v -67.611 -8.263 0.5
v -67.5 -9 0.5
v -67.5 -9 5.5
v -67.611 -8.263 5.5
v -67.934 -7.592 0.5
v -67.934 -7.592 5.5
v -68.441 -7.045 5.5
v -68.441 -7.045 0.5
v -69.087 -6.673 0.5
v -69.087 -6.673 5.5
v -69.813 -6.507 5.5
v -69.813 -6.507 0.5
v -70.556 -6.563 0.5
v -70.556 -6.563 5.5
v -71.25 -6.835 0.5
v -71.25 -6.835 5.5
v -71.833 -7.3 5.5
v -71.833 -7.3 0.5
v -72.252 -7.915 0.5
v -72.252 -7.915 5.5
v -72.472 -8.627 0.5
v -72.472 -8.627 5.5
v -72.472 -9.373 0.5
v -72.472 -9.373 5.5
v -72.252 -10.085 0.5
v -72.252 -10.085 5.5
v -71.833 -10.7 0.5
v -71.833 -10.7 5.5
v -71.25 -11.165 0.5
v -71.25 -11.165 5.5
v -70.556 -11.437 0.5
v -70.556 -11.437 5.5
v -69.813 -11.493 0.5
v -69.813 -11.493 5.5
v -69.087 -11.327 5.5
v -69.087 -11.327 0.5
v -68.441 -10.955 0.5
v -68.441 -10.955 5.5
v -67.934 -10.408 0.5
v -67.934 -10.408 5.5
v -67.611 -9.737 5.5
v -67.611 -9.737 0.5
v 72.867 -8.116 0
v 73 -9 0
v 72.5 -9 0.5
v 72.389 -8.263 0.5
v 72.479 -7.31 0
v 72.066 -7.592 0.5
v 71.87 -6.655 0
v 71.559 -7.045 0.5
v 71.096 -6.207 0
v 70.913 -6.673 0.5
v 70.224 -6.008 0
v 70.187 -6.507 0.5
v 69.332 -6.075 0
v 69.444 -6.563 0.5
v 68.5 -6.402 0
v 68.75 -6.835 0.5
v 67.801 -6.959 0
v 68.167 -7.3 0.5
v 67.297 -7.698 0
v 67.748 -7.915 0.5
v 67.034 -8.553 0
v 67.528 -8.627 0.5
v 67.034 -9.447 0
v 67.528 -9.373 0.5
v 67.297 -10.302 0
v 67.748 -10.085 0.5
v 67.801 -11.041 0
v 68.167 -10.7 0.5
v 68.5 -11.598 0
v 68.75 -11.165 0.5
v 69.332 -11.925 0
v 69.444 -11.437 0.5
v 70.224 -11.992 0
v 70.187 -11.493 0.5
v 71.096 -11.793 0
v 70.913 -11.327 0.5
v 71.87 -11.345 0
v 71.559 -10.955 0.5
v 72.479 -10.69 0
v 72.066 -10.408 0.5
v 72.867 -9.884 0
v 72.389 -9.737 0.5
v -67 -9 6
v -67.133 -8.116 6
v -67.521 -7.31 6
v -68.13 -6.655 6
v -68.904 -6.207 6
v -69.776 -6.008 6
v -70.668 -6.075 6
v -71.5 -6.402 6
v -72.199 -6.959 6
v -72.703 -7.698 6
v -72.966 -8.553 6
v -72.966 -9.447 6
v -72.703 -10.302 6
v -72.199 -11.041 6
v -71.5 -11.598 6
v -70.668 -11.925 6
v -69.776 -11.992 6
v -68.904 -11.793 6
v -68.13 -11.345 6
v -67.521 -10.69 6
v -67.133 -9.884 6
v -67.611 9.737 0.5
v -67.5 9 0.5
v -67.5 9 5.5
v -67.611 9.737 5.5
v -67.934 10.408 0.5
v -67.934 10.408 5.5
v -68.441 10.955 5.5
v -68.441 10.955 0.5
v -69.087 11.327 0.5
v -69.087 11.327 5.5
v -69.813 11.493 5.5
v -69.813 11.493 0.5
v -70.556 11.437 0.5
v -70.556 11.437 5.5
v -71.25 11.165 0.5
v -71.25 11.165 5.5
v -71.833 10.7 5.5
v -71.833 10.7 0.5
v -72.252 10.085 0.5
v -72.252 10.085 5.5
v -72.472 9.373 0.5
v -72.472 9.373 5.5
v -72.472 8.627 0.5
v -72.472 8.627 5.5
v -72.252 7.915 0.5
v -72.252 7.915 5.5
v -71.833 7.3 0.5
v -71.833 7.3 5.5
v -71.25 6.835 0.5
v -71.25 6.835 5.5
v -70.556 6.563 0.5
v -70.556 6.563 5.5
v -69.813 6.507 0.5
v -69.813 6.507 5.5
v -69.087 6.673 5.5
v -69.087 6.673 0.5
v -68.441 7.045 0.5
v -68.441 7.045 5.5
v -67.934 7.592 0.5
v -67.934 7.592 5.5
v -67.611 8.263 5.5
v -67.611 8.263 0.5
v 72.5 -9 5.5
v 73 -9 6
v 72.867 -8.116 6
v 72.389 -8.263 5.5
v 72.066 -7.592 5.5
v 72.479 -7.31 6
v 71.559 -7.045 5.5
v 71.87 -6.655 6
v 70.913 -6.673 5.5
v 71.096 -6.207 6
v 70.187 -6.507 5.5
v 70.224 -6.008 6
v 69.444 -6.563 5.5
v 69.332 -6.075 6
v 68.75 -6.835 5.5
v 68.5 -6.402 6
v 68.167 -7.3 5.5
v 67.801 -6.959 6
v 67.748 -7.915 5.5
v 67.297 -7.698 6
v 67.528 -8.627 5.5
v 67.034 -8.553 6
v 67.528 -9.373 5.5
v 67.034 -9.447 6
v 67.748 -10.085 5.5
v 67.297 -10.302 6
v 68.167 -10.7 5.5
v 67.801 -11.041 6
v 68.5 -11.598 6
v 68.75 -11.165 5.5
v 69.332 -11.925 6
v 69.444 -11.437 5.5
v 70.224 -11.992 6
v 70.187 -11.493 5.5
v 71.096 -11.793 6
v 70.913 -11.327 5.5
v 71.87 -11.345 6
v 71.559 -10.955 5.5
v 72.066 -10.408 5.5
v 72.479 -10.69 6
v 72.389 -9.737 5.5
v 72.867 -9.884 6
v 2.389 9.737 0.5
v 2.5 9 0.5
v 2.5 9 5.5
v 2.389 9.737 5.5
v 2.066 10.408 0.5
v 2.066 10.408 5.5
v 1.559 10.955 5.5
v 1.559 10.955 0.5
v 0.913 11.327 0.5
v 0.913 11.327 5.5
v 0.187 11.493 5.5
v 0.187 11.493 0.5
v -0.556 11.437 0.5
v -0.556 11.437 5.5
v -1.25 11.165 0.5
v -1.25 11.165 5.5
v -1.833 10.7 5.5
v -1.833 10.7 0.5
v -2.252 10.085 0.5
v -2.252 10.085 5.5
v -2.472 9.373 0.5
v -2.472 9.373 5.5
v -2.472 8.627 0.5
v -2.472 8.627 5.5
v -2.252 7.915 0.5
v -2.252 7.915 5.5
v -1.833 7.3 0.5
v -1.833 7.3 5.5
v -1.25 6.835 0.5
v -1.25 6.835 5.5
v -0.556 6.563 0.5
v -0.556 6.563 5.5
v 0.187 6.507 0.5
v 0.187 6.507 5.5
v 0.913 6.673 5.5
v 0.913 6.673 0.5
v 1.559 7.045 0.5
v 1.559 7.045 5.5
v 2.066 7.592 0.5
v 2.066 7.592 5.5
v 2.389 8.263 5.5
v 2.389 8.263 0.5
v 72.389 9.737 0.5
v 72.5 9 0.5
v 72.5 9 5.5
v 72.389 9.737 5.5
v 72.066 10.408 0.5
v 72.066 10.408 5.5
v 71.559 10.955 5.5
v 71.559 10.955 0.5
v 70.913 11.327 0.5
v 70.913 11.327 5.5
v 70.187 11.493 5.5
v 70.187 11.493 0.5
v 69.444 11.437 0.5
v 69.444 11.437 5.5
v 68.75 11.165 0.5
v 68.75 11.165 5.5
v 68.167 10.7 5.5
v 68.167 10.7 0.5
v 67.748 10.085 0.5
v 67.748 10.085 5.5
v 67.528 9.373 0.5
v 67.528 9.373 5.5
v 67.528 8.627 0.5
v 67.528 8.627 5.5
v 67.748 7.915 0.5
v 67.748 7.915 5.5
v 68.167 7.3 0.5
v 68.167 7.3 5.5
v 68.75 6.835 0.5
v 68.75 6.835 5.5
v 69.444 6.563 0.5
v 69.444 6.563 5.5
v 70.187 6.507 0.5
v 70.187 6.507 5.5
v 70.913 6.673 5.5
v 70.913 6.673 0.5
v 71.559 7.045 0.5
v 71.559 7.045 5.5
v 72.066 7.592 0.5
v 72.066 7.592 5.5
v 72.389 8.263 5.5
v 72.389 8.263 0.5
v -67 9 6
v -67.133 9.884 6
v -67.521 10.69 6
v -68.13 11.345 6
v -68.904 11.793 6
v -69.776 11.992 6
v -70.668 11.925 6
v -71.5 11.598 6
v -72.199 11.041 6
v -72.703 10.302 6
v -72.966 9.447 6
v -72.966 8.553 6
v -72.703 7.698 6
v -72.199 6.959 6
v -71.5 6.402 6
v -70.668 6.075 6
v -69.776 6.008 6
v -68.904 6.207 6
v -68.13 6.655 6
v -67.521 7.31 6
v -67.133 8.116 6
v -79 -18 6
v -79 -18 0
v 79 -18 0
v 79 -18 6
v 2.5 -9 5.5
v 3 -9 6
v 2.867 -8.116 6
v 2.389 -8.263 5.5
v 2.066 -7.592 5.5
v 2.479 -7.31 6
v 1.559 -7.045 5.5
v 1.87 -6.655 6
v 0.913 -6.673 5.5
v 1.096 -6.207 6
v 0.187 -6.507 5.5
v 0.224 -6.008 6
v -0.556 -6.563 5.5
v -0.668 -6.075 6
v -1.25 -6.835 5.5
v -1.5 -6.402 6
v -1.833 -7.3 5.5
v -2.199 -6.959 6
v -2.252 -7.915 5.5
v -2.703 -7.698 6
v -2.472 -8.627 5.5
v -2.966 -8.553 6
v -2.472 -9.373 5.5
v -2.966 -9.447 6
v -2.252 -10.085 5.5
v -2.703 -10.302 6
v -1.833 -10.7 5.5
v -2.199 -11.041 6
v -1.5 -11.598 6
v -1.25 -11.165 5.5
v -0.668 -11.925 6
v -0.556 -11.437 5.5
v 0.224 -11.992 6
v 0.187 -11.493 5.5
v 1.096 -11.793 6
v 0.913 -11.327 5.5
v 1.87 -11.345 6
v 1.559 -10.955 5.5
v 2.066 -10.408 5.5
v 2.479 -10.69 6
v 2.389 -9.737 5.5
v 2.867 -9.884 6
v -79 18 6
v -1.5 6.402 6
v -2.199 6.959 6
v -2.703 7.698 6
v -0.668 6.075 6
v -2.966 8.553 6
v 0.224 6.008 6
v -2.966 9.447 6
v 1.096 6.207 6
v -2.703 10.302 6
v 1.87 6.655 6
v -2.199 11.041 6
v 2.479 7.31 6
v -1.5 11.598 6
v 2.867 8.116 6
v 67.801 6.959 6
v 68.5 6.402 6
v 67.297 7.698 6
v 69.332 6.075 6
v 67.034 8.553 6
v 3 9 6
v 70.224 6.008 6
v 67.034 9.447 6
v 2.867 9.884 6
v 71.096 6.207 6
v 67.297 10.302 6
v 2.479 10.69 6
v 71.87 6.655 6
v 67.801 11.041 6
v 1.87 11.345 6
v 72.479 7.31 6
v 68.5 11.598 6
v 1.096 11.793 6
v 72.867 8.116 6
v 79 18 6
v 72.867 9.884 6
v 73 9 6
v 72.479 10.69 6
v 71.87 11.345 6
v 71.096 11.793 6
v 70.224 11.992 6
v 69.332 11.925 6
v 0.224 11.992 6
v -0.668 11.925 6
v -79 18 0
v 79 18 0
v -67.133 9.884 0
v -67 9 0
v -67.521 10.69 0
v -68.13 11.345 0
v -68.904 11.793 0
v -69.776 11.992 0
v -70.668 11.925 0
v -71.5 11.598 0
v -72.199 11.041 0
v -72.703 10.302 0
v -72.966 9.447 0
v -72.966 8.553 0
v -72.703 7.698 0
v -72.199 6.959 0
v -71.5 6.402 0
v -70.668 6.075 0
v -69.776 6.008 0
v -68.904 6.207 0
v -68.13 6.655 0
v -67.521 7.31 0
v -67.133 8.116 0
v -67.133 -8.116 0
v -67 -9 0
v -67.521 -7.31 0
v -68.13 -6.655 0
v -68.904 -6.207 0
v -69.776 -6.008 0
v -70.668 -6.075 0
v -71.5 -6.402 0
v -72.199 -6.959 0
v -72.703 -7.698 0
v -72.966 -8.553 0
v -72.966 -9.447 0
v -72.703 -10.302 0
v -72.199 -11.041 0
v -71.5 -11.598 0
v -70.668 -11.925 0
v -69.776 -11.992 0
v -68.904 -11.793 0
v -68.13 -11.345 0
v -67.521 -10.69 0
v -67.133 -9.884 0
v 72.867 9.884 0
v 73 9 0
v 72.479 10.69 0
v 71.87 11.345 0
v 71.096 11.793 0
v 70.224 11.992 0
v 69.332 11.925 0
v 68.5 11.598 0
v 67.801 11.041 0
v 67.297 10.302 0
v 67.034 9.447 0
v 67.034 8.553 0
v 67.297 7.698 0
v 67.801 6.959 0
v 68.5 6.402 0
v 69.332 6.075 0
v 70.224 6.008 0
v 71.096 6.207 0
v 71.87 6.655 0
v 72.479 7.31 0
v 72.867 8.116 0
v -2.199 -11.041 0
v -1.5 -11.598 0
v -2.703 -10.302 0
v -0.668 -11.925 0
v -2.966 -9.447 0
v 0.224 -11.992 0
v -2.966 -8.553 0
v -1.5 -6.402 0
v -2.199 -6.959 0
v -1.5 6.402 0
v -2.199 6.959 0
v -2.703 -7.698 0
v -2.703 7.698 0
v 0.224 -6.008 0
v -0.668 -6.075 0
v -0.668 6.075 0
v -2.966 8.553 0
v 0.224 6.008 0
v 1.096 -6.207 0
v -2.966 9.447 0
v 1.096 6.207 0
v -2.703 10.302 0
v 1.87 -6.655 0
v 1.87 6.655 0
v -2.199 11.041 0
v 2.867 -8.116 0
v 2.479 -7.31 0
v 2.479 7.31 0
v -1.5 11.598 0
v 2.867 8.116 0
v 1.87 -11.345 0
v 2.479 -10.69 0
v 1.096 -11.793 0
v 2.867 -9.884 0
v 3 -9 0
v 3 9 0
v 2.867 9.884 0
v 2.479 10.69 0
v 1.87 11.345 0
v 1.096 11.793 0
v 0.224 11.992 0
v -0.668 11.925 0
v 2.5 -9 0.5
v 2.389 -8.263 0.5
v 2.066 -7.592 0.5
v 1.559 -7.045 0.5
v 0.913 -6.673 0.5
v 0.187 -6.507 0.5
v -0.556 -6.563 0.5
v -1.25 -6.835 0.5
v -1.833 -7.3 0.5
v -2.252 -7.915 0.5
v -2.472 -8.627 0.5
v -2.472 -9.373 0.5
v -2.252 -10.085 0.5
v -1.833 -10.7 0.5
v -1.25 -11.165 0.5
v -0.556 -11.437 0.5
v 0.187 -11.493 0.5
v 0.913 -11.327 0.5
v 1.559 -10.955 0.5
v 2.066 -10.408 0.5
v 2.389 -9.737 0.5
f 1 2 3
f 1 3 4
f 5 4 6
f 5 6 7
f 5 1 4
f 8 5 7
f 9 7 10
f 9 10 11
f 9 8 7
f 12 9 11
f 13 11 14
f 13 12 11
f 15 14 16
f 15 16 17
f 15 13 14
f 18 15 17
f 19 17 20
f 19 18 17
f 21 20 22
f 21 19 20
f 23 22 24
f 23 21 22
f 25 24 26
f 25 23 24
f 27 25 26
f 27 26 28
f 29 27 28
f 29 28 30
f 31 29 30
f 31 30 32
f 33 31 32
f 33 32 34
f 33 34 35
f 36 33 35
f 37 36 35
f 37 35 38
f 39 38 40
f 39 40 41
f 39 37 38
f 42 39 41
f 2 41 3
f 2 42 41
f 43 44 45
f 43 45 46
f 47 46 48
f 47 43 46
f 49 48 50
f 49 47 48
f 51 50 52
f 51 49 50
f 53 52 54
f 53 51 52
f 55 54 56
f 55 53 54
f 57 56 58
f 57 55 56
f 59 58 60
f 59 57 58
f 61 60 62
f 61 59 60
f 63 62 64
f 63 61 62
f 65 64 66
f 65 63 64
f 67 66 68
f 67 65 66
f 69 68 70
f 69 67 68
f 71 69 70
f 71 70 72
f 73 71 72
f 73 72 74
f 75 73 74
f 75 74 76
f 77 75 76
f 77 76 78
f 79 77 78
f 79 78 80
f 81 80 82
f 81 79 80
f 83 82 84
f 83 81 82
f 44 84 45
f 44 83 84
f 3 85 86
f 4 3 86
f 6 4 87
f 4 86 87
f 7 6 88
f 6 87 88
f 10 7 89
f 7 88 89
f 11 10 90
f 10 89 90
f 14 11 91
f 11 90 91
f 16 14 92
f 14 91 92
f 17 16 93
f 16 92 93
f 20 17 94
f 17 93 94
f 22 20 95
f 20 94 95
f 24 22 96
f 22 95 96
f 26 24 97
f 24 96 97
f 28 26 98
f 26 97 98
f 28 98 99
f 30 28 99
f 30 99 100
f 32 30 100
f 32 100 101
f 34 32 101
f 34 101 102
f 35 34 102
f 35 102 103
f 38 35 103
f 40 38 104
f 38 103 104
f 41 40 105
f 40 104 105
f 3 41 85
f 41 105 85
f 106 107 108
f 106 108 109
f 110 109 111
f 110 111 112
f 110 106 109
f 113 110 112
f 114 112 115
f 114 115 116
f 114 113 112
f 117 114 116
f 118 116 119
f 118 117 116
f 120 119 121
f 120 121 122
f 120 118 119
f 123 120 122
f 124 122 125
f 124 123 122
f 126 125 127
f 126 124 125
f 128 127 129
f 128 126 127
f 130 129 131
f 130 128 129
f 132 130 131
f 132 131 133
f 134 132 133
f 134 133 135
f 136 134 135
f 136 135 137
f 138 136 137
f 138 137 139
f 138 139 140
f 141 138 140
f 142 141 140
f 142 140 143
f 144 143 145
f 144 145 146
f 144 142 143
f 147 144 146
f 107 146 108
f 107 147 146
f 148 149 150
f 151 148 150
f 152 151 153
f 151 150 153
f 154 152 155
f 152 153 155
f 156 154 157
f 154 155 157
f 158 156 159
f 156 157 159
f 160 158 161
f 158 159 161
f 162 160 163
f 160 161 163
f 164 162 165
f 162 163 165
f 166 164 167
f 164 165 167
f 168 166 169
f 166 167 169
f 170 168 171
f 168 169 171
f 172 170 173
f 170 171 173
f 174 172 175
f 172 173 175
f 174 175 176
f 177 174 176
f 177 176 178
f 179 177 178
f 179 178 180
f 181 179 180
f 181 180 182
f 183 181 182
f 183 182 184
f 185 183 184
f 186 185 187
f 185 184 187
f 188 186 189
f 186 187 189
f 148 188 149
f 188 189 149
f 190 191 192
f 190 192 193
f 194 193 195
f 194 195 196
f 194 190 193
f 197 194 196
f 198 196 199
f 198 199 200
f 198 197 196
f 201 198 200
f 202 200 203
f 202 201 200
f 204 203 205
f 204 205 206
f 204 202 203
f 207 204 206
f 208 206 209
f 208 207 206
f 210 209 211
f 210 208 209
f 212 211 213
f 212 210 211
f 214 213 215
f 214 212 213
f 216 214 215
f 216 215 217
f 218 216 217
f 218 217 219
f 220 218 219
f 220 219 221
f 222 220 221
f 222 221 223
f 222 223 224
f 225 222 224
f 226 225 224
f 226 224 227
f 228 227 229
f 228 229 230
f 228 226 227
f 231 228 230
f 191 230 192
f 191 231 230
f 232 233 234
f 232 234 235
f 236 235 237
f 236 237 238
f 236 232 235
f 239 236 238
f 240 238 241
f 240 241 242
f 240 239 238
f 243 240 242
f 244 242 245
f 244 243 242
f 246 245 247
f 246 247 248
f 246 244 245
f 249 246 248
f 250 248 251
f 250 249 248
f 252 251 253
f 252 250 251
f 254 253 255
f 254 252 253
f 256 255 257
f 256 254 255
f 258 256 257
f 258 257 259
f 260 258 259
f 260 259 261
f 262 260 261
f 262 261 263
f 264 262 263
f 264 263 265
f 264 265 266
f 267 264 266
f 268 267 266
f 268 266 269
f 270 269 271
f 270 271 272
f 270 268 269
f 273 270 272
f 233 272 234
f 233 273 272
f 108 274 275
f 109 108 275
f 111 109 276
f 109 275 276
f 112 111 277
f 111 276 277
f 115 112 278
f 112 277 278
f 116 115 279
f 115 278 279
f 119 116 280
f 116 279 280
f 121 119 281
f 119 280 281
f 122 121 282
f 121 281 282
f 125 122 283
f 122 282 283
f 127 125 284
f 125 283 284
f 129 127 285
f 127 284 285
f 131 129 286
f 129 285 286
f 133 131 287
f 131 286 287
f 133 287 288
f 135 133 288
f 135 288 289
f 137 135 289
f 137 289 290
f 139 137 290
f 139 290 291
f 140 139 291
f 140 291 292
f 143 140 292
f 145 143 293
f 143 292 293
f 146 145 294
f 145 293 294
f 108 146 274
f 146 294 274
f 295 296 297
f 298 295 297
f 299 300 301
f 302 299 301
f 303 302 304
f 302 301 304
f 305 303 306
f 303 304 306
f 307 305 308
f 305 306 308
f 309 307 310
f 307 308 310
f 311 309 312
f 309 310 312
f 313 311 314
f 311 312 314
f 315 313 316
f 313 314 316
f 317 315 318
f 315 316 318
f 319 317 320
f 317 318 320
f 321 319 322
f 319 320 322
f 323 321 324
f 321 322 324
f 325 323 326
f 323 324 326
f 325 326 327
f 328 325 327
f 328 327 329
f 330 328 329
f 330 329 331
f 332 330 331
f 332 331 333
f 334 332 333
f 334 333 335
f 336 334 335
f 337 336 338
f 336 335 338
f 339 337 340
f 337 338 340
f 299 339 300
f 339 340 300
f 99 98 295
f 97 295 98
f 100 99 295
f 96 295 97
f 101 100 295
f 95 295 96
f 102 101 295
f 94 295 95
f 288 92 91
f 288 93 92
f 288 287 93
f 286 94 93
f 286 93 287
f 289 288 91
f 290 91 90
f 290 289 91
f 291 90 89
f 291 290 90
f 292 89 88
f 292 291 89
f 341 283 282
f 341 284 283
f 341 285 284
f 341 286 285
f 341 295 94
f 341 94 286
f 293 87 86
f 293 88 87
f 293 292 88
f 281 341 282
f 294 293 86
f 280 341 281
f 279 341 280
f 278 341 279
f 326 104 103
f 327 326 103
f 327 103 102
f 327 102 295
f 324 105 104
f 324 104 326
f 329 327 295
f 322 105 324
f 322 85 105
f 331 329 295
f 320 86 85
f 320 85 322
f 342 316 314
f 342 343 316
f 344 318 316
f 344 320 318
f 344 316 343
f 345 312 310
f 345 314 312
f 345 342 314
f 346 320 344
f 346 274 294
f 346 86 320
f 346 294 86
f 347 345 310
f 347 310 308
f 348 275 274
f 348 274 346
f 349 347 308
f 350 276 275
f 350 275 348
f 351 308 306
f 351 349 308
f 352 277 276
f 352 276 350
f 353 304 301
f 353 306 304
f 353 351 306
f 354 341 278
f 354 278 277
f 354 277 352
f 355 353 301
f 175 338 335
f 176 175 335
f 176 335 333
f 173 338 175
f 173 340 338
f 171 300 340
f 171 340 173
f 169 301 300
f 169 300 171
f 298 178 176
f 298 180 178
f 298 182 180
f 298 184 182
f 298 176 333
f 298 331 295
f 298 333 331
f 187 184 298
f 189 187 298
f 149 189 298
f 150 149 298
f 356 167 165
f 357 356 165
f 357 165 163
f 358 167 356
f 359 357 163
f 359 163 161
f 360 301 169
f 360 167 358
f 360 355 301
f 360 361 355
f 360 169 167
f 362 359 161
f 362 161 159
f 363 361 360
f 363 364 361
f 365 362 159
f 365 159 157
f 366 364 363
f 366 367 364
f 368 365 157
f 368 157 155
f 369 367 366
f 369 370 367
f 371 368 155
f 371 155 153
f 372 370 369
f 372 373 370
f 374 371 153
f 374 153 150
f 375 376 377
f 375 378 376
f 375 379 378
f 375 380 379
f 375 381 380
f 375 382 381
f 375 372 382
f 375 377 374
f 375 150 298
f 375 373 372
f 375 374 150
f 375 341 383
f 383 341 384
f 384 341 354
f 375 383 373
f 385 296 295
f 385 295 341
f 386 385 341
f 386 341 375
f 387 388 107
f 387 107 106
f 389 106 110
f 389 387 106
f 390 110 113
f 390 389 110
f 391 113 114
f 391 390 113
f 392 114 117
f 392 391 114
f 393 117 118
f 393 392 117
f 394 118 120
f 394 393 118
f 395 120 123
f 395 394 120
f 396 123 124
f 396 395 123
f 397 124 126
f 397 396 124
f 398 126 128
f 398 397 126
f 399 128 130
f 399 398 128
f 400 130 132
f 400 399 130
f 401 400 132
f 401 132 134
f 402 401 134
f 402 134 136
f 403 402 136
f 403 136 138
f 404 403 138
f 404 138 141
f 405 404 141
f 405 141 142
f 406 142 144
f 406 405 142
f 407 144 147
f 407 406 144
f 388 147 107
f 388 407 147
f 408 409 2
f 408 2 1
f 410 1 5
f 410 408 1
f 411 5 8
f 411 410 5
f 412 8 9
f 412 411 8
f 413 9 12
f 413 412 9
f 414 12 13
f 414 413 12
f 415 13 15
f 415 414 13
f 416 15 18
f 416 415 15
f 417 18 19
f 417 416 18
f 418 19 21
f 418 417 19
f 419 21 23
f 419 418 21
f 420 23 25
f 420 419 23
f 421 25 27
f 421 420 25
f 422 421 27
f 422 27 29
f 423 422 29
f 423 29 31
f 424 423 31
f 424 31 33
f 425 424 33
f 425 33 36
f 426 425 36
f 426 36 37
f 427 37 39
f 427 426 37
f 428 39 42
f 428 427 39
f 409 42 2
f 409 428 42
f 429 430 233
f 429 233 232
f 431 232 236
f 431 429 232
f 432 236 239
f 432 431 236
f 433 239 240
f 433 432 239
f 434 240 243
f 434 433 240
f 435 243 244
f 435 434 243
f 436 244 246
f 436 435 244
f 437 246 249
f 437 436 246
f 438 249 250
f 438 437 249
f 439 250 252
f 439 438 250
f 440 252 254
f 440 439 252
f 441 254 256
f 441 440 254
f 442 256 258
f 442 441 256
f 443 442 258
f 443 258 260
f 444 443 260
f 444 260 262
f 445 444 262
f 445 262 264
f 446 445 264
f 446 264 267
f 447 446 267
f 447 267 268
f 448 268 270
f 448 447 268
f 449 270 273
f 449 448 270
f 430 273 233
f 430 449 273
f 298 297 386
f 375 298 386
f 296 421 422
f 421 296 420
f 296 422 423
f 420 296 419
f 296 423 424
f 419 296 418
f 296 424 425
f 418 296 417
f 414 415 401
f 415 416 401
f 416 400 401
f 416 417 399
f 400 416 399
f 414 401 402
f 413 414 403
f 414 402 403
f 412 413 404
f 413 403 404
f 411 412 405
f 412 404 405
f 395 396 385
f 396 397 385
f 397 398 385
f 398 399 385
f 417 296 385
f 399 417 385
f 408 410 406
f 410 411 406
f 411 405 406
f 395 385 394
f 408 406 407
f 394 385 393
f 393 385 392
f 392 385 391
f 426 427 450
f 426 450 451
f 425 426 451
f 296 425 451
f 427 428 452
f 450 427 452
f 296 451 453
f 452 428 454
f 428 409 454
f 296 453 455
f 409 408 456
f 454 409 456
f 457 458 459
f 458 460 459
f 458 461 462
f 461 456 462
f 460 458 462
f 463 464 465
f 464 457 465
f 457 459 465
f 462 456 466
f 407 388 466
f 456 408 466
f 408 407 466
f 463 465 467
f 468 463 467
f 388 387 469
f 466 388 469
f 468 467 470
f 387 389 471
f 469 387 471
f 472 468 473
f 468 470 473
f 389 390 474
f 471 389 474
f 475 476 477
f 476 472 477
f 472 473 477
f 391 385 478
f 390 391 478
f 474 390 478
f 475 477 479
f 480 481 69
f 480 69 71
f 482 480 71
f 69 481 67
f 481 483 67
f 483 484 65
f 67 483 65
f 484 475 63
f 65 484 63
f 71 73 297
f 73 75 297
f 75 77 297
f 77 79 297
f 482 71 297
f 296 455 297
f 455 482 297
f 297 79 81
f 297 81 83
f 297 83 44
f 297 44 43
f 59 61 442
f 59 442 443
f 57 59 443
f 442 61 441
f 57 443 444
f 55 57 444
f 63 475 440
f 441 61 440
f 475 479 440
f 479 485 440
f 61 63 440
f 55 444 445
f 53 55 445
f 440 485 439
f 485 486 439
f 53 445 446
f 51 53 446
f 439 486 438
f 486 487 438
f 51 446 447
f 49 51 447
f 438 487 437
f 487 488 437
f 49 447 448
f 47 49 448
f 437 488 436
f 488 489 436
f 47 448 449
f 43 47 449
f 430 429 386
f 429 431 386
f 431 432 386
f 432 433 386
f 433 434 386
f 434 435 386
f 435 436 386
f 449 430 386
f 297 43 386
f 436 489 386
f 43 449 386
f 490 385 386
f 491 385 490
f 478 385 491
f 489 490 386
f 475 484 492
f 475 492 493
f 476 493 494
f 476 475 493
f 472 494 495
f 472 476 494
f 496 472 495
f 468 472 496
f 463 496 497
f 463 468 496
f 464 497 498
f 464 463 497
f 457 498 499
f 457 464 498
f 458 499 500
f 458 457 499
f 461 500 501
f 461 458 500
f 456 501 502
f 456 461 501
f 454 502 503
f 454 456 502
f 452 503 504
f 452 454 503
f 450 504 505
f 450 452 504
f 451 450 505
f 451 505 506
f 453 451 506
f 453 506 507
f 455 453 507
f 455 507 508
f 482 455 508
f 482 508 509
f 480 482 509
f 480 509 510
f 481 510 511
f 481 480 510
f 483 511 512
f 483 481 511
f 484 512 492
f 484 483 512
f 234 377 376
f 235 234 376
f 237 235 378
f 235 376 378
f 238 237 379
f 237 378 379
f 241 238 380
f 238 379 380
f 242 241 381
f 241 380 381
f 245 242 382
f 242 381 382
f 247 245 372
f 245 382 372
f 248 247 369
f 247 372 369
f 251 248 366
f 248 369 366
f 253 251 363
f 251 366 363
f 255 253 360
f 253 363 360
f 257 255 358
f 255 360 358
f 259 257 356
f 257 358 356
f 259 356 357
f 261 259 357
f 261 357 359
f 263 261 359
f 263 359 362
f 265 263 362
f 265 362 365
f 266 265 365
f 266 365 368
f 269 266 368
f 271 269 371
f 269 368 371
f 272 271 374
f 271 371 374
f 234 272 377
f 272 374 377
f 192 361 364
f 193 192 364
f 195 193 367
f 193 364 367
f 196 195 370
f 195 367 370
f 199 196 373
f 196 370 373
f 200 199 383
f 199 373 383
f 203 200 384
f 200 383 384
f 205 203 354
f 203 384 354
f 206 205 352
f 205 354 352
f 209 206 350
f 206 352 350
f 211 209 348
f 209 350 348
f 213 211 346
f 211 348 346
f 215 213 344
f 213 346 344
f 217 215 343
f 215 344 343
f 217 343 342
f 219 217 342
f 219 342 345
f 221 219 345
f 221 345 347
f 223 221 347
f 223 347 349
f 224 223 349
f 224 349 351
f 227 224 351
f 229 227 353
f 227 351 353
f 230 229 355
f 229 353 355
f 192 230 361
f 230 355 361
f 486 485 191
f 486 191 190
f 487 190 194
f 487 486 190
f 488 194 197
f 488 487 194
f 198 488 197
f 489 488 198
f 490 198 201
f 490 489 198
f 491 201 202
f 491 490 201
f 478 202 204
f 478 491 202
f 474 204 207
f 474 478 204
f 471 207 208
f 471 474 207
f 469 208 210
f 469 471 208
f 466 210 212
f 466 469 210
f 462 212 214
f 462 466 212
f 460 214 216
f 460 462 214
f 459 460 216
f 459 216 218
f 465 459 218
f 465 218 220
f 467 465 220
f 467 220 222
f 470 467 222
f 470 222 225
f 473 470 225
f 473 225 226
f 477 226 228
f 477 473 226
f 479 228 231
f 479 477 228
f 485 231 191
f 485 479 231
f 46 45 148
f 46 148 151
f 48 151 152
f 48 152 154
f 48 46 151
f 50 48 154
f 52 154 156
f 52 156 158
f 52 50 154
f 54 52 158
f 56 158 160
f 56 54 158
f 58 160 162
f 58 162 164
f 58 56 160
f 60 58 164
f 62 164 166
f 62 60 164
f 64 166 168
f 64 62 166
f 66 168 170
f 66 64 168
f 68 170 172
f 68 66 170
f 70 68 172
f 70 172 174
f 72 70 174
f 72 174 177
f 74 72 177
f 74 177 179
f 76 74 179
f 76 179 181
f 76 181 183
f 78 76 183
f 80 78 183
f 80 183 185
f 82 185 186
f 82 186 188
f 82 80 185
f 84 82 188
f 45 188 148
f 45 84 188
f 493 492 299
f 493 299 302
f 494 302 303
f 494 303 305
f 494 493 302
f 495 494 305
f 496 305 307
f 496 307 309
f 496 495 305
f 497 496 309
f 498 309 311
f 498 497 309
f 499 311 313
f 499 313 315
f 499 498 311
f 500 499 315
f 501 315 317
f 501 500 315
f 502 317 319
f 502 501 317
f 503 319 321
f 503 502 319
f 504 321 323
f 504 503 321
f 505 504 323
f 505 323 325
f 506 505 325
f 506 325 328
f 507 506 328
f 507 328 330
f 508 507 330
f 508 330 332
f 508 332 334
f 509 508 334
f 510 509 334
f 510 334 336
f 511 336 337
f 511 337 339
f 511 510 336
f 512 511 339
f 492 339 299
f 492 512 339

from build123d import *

# Parameters (mm, degrees)
F0_W     = 158
F0_H     = 36
F0_R     = 2.5
F1_DEPTH = 6
F2_SIZE  = 0.5


with BuildPart() as f1:
    # F0 (on Top) → F1 (new body)
    with BuildSketch(Plane.XY):
        Rectangle(F0_W, F0_H)
        with Locations((-70, -9)):
            Circle(F0_R, mode=Mode.SUBTRACT)
        with Locations((0, -9)):
            Circle(F0_R, mode=Mode.SUBTRACT)
        with Locations((70, -9)):
            Circle(F0_R, mode=Mode.SUBTRACT)
        with Locations((-70, 9)):
            Circle(F0_R, mode=Mode.SUBTRACT)
        with Locations((0, 9)):
            Circle(F0_R, mode=Mode.SUBTRACT)
        with Locations((70, 9)):
            Circle(F0_R, mode=Mode.SUBTRACT)
    extrude(amount=F1_DEPTH)

    # F2
    f2_edges = [f1.edges().sort_by_distance(p)[0] for p in [
        (-67.5, -9, 3),
        (-72.5, -9, 0),
        (-72.5, -9, 6),
        (-67.5, 9, 3),
        (-72.5, 9, 0),
        (-72.5, 9, 6),
        (2.5, -9, 3),
        (-2.5, -9, 0),
        (-2.5, -9, 6),
        (2.5, 9, 3),
        (-2.5, 9, 0),
        (-2.5, 9, 6),
        (72.5, -9, 3),
        (67.5, -9, 0),
        (67.5, -9, 6),
        (72.5, 9, 3),
        (67.5, 9, 0),
        (67.5, 9, 6),
    ]]
    chamfer(f2_edges, length=F2_SIZE)


solid = f1.part
